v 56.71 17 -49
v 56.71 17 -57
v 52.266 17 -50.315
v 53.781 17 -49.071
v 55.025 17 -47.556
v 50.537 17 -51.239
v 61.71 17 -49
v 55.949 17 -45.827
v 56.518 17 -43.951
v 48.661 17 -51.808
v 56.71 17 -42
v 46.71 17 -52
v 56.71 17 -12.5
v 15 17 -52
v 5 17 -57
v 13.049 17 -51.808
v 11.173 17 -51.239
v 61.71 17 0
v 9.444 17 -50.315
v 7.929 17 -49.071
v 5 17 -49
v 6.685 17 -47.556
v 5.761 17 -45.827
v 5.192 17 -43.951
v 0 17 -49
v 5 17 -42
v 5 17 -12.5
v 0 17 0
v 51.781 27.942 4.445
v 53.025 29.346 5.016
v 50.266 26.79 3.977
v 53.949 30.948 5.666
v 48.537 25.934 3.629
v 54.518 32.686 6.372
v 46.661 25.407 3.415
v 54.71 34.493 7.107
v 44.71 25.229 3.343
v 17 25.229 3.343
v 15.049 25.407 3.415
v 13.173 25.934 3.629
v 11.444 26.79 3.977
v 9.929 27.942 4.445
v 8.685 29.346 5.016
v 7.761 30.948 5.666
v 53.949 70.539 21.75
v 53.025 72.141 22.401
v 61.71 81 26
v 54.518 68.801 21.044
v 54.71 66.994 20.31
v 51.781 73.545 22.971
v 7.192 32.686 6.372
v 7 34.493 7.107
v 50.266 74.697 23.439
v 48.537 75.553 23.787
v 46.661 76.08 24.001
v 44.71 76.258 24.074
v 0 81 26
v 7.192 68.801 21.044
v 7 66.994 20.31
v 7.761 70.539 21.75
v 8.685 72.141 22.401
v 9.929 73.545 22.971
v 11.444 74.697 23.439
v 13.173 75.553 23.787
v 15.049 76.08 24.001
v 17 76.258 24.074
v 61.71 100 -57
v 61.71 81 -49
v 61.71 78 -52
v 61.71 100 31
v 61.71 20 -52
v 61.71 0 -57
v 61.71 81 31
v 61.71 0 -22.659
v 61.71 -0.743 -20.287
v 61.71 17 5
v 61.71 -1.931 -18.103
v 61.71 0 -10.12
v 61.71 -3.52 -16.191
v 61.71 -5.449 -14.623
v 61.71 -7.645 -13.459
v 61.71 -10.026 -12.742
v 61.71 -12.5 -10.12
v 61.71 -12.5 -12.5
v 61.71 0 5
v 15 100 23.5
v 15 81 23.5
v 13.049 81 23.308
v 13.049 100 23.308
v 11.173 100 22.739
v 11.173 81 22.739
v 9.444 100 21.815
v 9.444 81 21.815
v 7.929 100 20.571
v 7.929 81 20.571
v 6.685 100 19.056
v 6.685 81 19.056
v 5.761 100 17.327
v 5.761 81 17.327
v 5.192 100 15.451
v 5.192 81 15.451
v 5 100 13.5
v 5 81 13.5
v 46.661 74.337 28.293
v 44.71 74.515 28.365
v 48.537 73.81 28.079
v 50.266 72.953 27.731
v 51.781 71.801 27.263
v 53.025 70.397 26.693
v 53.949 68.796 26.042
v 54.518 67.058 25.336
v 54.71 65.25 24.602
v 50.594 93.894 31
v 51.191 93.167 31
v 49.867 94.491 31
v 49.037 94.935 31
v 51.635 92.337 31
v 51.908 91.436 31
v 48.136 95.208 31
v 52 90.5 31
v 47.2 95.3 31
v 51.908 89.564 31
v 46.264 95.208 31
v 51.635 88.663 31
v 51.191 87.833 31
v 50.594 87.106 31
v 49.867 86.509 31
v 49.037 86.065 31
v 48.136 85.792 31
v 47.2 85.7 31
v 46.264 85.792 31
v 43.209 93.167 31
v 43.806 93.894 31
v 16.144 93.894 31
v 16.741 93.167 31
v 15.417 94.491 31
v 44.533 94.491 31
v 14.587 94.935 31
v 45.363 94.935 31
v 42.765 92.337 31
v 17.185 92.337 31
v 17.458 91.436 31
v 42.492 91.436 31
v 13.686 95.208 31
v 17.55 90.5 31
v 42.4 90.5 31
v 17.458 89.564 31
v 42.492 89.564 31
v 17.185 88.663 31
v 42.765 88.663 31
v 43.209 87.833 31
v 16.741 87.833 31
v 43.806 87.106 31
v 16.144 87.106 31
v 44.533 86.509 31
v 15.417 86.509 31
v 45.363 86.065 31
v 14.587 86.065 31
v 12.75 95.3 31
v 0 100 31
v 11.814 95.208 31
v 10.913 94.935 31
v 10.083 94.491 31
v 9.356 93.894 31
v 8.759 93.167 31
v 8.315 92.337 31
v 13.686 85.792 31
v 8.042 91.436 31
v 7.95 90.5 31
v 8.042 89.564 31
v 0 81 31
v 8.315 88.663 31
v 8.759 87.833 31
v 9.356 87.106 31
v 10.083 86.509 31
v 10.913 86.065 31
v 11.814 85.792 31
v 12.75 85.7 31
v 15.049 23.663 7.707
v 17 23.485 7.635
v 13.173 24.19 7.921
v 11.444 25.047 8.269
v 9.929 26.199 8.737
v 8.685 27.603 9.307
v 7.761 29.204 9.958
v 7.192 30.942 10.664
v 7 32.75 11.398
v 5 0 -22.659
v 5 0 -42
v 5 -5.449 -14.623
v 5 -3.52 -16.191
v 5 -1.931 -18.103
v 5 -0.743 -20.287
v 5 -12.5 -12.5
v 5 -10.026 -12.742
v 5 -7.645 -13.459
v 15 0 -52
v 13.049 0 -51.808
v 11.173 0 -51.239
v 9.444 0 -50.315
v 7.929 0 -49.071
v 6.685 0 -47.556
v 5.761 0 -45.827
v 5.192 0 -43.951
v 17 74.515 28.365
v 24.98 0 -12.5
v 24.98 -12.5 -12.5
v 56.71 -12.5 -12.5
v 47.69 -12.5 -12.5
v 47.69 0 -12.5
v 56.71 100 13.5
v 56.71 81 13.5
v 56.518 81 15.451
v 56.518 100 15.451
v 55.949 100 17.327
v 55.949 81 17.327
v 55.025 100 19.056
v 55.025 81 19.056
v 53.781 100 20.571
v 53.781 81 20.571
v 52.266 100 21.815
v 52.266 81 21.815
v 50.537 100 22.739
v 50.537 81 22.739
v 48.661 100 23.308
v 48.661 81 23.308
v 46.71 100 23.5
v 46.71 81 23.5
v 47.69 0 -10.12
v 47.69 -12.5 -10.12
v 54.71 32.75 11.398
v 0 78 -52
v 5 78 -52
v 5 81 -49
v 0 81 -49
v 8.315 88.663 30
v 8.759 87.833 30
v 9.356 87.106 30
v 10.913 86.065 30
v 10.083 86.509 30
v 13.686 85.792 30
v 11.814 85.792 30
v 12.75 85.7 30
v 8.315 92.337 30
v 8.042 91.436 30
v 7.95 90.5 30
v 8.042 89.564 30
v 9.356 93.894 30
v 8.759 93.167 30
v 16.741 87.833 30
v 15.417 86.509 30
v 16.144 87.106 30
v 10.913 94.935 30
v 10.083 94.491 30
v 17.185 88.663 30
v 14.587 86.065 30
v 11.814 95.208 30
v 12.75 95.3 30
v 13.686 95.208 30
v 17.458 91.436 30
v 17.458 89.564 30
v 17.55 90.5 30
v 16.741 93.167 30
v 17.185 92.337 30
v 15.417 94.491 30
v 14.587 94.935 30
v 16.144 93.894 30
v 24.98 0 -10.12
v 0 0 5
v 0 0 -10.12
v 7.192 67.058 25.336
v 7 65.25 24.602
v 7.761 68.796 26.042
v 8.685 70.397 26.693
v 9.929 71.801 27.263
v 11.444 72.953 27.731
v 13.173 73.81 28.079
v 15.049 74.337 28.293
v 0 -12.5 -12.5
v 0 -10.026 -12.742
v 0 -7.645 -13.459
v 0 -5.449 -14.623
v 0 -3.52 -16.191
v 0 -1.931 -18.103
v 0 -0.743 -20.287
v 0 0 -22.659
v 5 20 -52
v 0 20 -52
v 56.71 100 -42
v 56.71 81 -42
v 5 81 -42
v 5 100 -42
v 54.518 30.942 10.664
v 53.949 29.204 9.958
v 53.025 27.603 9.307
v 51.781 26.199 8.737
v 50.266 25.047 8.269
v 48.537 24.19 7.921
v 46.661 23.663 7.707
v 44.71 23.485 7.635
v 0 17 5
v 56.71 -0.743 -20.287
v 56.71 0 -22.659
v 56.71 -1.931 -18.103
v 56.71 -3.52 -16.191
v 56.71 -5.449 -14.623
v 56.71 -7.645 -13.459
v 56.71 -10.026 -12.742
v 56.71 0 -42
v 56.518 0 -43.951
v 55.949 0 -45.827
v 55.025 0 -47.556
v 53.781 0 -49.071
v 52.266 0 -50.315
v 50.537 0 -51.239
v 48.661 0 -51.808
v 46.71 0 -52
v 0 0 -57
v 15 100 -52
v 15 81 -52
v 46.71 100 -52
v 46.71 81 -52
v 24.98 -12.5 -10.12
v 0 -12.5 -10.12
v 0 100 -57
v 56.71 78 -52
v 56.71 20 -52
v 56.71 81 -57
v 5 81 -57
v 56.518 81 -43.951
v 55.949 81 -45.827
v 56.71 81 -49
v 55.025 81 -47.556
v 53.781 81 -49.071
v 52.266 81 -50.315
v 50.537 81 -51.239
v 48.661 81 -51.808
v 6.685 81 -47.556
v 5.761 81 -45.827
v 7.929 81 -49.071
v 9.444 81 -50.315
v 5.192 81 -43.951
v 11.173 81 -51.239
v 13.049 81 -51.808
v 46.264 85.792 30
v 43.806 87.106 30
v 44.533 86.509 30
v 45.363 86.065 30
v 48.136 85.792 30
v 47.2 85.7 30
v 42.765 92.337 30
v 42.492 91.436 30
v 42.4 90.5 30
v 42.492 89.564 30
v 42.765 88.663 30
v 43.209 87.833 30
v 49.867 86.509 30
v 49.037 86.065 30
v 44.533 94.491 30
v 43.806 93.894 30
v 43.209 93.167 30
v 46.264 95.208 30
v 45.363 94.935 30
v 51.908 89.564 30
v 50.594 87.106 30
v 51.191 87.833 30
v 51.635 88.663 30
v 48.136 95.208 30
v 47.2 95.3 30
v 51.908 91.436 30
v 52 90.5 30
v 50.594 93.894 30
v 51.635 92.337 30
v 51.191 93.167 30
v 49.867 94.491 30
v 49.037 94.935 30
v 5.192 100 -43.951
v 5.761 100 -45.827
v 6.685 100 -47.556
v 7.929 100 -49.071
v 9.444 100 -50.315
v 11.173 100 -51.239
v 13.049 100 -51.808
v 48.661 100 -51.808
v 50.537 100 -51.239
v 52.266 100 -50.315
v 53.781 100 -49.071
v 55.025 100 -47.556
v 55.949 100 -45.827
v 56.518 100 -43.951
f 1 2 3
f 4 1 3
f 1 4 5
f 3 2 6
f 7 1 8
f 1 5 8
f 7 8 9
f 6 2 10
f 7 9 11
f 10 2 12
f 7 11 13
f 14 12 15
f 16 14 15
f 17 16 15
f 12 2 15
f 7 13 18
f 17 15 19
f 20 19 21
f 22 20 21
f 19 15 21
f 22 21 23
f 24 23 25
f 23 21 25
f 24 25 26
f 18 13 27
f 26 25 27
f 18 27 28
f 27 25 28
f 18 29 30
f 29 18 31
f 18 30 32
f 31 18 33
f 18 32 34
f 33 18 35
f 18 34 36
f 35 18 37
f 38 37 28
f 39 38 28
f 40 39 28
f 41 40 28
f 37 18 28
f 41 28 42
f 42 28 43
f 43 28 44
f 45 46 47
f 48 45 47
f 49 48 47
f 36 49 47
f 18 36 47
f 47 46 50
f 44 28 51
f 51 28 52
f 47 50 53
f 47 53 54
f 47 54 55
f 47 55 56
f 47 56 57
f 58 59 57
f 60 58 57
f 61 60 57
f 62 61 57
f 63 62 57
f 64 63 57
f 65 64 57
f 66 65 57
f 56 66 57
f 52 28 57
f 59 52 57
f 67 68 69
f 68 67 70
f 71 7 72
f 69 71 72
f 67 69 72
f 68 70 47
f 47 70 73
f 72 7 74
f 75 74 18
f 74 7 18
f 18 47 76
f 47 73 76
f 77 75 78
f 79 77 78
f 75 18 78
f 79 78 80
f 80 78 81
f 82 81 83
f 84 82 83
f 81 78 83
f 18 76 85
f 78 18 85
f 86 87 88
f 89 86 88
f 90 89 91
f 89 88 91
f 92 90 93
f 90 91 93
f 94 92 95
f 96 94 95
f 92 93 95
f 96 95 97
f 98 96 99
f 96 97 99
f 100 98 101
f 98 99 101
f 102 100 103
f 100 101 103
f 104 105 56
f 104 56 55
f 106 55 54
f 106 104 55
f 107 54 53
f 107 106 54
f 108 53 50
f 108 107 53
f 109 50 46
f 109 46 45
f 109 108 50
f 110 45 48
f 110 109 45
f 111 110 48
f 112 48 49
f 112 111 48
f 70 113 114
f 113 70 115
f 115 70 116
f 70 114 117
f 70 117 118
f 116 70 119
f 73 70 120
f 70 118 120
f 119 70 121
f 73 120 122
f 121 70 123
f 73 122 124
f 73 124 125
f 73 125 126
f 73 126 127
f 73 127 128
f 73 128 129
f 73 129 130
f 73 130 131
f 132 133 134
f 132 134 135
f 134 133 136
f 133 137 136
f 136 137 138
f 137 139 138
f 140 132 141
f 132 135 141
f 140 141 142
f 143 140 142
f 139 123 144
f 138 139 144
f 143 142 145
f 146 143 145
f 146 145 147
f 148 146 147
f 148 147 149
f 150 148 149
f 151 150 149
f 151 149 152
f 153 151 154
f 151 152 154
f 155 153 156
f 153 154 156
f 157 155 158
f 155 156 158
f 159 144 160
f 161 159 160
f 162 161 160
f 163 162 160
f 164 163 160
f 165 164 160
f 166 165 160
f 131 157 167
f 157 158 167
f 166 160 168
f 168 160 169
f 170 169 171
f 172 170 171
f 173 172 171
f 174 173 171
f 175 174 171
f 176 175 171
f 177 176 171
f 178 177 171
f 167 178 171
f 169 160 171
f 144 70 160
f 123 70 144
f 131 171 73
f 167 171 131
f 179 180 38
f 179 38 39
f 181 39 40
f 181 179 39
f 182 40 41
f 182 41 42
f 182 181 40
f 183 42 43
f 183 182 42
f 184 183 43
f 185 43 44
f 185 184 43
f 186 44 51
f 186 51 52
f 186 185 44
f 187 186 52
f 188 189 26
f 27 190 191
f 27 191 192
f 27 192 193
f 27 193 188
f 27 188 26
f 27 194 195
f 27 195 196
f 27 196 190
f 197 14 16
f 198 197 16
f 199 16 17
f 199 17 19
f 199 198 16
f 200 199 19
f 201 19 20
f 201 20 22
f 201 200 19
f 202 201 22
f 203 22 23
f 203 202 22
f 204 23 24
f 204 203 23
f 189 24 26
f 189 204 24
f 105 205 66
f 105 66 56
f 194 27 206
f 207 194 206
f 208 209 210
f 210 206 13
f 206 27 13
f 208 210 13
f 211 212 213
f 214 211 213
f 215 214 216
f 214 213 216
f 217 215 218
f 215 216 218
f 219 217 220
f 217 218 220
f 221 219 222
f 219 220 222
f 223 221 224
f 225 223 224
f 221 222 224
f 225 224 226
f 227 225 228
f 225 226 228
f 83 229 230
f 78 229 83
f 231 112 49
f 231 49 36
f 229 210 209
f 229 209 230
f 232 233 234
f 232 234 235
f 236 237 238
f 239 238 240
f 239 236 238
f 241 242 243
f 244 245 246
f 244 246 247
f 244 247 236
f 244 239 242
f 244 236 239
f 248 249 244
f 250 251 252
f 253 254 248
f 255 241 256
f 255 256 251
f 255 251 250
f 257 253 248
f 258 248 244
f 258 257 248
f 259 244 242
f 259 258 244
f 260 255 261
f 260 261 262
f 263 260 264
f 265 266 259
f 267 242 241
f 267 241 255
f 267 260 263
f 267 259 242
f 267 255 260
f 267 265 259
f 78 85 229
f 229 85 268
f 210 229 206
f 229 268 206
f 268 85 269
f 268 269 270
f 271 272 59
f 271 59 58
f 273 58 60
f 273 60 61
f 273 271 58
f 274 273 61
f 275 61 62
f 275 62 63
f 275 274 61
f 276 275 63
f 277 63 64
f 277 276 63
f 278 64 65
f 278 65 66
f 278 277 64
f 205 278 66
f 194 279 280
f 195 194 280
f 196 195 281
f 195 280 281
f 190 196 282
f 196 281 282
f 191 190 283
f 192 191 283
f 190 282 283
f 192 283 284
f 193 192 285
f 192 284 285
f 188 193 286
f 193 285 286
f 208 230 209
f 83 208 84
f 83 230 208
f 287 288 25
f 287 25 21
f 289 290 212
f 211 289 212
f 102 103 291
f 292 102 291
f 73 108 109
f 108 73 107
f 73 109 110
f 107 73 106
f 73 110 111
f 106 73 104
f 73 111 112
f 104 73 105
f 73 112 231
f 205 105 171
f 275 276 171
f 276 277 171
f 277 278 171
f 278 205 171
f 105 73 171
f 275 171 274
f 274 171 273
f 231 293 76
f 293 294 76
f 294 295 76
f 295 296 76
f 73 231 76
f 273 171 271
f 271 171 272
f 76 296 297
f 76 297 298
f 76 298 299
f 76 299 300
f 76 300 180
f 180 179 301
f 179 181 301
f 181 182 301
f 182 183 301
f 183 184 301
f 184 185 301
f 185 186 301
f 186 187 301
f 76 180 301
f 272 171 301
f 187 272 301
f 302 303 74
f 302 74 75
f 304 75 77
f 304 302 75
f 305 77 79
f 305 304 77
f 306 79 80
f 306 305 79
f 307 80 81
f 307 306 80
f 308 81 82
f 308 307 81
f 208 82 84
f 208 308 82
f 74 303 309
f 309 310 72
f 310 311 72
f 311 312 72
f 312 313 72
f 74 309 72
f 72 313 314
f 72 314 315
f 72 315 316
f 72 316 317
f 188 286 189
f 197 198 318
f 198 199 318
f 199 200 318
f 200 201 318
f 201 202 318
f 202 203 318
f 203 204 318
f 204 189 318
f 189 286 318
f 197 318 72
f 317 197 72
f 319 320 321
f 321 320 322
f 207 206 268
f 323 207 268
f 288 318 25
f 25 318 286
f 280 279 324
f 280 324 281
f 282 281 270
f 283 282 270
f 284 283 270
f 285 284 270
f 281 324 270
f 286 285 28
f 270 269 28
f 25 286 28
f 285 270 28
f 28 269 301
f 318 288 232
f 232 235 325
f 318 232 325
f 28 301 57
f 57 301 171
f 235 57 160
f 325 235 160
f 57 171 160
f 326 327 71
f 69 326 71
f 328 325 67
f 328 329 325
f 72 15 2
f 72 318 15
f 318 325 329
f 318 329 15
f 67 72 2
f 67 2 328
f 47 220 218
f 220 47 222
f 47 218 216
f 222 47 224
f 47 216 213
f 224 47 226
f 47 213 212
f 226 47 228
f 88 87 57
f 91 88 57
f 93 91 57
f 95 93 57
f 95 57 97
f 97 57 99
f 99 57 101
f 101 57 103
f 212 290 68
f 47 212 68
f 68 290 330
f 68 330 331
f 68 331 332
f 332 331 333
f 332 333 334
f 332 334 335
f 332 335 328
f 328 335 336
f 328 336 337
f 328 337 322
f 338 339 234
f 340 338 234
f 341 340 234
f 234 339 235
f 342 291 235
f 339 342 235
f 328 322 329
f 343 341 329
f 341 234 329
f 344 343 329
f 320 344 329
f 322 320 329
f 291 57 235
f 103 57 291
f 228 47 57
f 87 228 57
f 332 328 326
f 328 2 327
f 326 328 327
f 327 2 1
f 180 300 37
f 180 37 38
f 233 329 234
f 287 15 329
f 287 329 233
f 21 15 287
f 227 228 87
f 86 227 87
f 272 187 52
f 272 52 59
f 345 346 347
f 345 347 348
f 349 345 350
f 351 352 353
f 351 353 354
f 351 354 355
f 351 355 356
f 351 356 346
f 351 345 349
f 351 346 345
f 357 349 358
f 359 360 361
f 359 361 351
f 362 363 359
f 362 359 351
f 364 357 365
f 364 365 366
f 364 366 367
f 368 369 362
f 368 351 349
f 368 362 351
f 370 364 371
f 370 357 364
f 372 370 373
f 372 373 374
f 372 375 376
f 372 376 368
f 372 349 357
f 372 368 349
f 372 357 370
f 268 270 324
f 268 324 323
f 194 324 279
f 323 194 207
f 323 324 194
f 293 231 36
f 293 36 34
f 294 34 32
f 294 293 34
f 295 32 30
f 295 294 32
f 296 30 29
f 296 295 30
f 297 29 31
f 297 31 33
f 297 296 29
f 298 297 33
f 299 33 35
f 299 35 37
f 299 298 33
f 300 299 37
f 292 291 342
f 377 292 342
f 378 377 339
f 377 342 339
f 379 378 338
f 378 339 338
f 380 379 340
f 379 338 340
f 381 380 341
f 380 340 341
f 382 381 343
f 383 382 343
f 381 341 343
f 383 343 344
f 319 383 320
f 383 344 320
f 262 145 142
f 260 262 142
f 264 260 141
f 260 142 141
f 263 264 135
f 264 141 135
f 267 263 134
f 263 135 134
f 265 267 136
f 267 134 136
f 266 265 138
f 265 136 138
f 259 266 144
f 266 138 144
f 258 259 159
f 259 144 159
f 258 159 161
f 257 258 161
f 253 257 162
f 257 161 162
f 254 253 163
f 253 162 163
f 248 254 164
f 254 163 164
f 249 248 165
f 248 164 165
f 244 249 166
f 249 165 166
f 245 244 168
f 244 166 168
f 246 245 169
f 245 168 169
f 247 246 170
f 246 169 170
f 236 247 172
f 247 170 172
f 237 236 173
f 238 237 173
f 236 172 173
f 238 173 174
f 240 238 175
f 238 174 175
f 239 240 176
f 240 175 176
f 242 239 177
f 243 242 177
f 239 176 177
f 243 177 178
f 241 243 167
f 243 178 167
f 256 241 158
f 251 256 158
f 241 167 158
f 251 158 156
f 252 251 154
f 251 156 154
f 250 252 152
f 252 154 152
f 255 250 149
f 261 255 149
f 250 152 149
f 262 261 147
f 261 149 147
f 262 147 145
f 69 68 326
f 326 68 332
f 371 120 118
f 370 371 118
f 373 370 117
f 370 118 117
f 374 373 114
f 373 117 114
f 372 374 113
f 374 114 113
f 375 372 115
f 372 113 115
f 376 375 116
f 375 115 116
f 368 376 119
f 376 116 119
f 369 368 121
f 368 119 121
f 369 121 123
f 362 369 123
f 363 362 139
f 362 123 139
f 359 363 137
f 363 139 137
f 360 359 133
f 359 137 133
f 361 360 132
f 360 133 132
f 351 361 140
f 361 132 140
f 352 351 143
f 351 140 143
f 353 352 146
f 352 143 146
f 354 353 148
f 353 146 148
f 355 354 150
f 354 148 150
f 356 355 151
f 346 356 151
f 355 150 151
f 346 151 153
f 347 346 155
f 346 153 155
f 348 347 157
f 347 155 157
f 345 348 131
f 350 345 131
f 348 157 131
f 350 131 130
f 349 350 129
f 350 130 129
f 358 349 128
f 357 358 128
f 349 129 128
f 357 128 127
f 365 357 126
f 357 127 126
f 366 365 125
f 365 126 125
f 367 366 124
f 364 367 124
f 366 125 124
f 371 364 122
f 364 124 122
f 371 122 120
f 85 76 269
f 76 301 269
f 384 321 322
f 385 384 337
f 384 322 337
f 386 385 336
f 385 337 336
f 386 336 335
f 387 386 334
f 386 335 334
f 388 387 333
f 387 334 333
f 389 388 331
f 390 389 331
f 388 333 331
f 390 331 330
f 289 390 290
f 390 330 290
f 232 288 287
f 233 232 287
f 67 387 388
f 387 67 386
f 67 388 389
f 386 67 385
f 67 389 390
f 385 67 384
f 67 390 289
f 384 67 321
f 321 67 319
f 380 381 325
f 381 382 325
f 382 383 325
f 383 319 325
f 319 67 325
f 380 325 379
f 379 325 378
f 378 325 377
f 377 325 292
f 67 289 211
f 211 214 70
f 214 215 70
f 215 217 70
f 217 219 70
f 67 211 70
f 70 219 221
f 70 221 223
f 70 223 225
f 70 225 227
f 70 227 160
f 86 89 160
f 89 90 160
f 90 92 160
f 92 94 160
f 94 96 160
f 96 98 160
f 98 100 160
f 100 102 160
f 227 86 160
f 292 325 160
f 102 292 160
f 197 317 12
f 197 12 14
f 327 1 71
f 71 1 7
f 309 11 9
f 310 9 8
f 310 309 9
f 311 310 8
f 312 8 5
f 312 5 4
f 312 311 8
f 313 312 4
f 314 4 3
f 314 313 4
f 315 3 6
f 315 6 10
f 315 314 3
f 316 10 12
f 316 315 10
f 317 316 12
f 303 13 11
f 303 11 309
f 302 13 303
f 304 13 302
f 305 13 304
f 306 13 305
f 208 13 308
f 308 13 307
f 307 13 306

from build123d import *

# Parameters (mm, degrees)
BOSS_EXTRUDE1_DEPTH  = 58.71
SKETCH4_R            = 4.8
CUT_EXTRUDE1_DEPTH   = 1
SKETCH5_R            = 4.8
CUT_EXTRUDE2_DEPTH   = 1
SKETCH6_W            = 19
SKETCH6_H            = 26
BOSS_EXTRUDE3_DEPTH  = 58.71
SKETCH7_W            = 58.71
SKETCH7_H            = 17
SKETCH7_H_2          = 19
BOSS_EXTRUDE4_DEPTH  = 57
BOSS_EXTRUDE5_DEPTH  = 3
CUT_EXTRUDE3_DEPTH   = 17
CUT_EXTRUDE4_START   = -19
CUT_EXTRUDE4_DEPTH   = 19
CUT_EXTRUDE5_DEPTH   = 4.632332886
SKETCH12_W           = 5
SKETCH12_H           = 5
BOSS_EXTRUDE6_DEPTH  = 100
CHAMFER1_SIZE        = 3
SKETCH13_W           = 61.71
SKETCH13_H           = 17.5
BOSS_EXTRUDE7_DEPTH  = 17
SKETCH14_W           = 24.98
SKETCH14_H           = 2.38
SKETCH14_W_2         = 14.02
BOSS_EXTRUDE8_DEPTH  = 12.5
BOSS_EXTRUDE9_DEPTH  = 5
BOSS_EXTRUDE10_START = -5
BOSS_EXTRUDE10_DEPTH = 5


with BuildPart() as part:
    # Sketch3 → Boss-Extrude1 (new body)
    with BuildSketch(Plane.YZ):
        Polygon((0, 5), (0, 0), (17, 0), (81, 26), (100, 26), (100, 31), (81, 31), (17, 5), align=None)
    extrude(amount=BOSS_EXTRUDE1_DEPTH)

    # Sketch4 → Cut-Extrude1 (cut)
    with BuildSketch(Plane.XY.offset(31)):
        with Locations((12.75, 90.5)):
            Circle(SKETCH4_R)
        with Locations((47.2, 90.5)):
            Circle(SKETCH4_R)
    extrude(amount=-CUT_EXTRUDE1_DEPTH, mode=Mode.SUBTRACT)

    # Sketch5 → Cut-Extrude2 (cut)
    with BuildSketch(Plane.XY.offset(5)):
        with Locations((21.94, 8.5)):
            Circle(SKETCH5_R)
        with Locations((36.94, 8.5)):
            Circle(SKETCH5_R)
    extrude(amount=-CUT_EXTRUDE2_DEPTH, mode=Mode.SUBTRACT)

    # Sketch6 → Boss-Extrude3 (add)
    with BuildSketch(Plane.YZ.offset(58.71)):
        with Locations((90.5, 13)):
            Rectangle(SKETCH6_W, SKETCH6_H)
    extrude(amount=-BOSS_EXTRUDE3_DEPTH)

    # Sketch7 → Boss-Extrude4 (add)
    with BuildSketch(Plane(origin=(0, 0, 0), x_dir=(1, 0, 0), z_dir=(0, 0, -1))):
        with Locations((29.355, -8.5)):
            Rectangle(SKETCH7_W, SKETCH7_H)
        with Locations((29.355, -90.5)):
            Rectangle(SKETCH7_W, SKETCH7_H_2)
    extrude(amount=BOSS_EXTRUDE4_DEPTH)

    # Sketch8 → Boss-Extrude5 (add)
    with BuildSketch(Plane.YZ.offset(58.71)):
        Polygon((100, 31), (81, 31), (17, 5), (0, 5), (0, -57), (17, -57), (17, 0), (81, 26), (81, -57), (100, -57), align=None)
    extrude(amount=BOSS_EXTRUDE5_DEPTH)

    # Sketch9 → Cut-Extrude3 (cut)
    with BuildSketch(Plane.XZ):
        with BuildLine():
            Line((15, -2.5), (46.71, -2.5))
            ThreePointArc((46.71, -2.5), (53.781067812, -5.428932188), (56.71, -12.5))
            Line((56.71, -12.5), (56.71, -42))
            ThreePointArc((56.71, -42), (53.781067812, -49.071067812), (46.71, -52))
            Line((46.71, -52), (15, -52))
            ThreePointArc((15, -52), (7.928932188, -49.071067812), (5, -42))
            Line((5, -42), (5, -12.5))
            ThreePointArc((5, -12.5), (7.928932188, -5.428932188), (15, -2.5))
        make_face()
    extrude(amount=-CUT_EXTRUDE3_DEPTH, mode=Mode.SUBTRACT)

    # Sketch10 → Cut-Extrude4 (cut)
    with BuildSketch(Plane(origin=(0, 100, 0), x_dir=(-1, 0, 0), z_dir=(0, 1, 0)).offset(CUT_EXTRUDE4_START)):
        with BuildLine():
            Line((-46.71, 23.5), (-15, 23.5))
            ThreePointArc((-15, 23.5), (-7.928932188, 20.571067812), (-5, 13.5))
            Line((-5, 13.5), (-5, -42))
            ThreePointArc((-5, -42), (-7.928932188, -49.071067812), (-15, -52))
            Line((-15, -52), (-46.71, -52))
            ThreePointArc((-46.71, -52), (-53.781067812, -49.071067812), (-56.71, -42))
            Line((-56.71, -42), (-56.71, 13.5))
            ThreePointArc((-56.71, 13.5), (-53.781067812, 20.571067812), (-46.71, 23.5))
        make_face()
    extrude(amount=CUT_EXTRUDE4_DEPTH, mode=Mode.SUBTRACT)

    # Sketch11 → Cut-Extrude5 (cut)
    with BuildSketch(Plane(origin=(0, 0.664710813, -1.636211232), x_dir=(1, 0, 0), z_dir=(0, -0.376377046955938, 0.9264665771223093))):
        with BuildLine():
            Line((17, 79.711481203), (44.71, 79.711481203))
            ThreePointArc((44.71, 79.711481203), (51.781067812, 76.782549014), (54.71, 69.711481203))
            Line((54.71, 69.711481203), (54.71, 34.631817046))
            ThreePointArc((54.71, 34.631817046), (51.781067812, 27.560749234), (44.71, 24.631817046))
            Line((44.71, 24.631817046), (17, 24.631817046))
            ThreePointArc((17, 24.631817046), (9.928932188, 27.560749234), (7, 34.631817046))
            Line((7, 34.631817046), (7, 69.711481203))
            ThreePointArc((7, 69.711481203), (9.928932188, 76.782549014), (17, 79.711481203))
        make_face()
    extrude(amount=-CUT_EXTRUDE5_DEPTH, mode=Mode.SUBTRACT)

    # Sketch12 → Boss-Extrude6 (add)
    with BuildSketch(Plane.XZ):
        with Locations((2.5, -54.5)):
            Rectangle(SKETCH12_W, SKETCH12_H)
        with Locations((59.21, -54.5)):
            Rectangle(SKETCH12_W, SKETCH12_H)
    extrude(amount=-BOSS_EXTRUDE6_DEPTH)

    # Chamfer1
    chamfer1_edges = [part.edges().sort_by_distance(p)[0] for p in [
        (2.5, 17, -52),
        (2.5, 81, -52),
        (59.21, 81, -52),
        (59.21, 17, -52),
    ]]
    chamfer(chamfer1_edges, length=CHAMFER1_SIZE)

    # Sketch13 → Boss-Extrude7 (add)
    with BuildSketch(Plane.XZ):
        with Locations((30.855, -3.75)):
            Rectangle(SKETCH13_W, SKETCH13_H)
    extrude(amount=-BOSS_EXTRUDE7_DEPTH)

    # Sketch14 → Boss-Extrude8 (add)
    with BuildSketch(Plane.XZ):
        with Locations((12.49, -11.31)):
            Rectangle(SKETCH14_W, SKETCH14_H)
        with Locations((54.7, -11.31)):
            Rectangle(SKETCH14_W_2, SKETCH14_H)
    extrude(amount=BOSS_EXTRUDE8_DEPTH)

    # Sketch15 → Boss-Extrude9 (add)
    with BuildSketch(Plane(origin=(0, 0, 0), x_dir=(0, -1, 0), z_dir=(-1, 0, 0))):
        with BuildLine():
            Line((0, -12.5), (12.5, -12.5))
            ThreePointArc((12.5, -12.5), (4.446217859, -15.360002914), (0, -22.6589186))
            Line((0, -22.6589186), (0, -12.5))
        make_face()
    extrude(amount=-BOSS_EXTRUDE9_DEPTH)

    # Sketch16 → Boss-Extrude10 (add)
    with BuildSketch(Plane.YZ.offset(61.71).offset(BOSS_EXTRUDE10_START)):
        with BuildLine():
            Line((-12.5, -12.5), (0, -12.5))
            Line((0, -12.5), (0, -22.6589186))
            ThreePointArc((0, -22.6589186), (-4.446217859, -15.360002914), (-12.5, -12.5))
        make_face()
    extrude(amount=BOSS_EXTRUDE10_DEPTH)


solid = part.part
